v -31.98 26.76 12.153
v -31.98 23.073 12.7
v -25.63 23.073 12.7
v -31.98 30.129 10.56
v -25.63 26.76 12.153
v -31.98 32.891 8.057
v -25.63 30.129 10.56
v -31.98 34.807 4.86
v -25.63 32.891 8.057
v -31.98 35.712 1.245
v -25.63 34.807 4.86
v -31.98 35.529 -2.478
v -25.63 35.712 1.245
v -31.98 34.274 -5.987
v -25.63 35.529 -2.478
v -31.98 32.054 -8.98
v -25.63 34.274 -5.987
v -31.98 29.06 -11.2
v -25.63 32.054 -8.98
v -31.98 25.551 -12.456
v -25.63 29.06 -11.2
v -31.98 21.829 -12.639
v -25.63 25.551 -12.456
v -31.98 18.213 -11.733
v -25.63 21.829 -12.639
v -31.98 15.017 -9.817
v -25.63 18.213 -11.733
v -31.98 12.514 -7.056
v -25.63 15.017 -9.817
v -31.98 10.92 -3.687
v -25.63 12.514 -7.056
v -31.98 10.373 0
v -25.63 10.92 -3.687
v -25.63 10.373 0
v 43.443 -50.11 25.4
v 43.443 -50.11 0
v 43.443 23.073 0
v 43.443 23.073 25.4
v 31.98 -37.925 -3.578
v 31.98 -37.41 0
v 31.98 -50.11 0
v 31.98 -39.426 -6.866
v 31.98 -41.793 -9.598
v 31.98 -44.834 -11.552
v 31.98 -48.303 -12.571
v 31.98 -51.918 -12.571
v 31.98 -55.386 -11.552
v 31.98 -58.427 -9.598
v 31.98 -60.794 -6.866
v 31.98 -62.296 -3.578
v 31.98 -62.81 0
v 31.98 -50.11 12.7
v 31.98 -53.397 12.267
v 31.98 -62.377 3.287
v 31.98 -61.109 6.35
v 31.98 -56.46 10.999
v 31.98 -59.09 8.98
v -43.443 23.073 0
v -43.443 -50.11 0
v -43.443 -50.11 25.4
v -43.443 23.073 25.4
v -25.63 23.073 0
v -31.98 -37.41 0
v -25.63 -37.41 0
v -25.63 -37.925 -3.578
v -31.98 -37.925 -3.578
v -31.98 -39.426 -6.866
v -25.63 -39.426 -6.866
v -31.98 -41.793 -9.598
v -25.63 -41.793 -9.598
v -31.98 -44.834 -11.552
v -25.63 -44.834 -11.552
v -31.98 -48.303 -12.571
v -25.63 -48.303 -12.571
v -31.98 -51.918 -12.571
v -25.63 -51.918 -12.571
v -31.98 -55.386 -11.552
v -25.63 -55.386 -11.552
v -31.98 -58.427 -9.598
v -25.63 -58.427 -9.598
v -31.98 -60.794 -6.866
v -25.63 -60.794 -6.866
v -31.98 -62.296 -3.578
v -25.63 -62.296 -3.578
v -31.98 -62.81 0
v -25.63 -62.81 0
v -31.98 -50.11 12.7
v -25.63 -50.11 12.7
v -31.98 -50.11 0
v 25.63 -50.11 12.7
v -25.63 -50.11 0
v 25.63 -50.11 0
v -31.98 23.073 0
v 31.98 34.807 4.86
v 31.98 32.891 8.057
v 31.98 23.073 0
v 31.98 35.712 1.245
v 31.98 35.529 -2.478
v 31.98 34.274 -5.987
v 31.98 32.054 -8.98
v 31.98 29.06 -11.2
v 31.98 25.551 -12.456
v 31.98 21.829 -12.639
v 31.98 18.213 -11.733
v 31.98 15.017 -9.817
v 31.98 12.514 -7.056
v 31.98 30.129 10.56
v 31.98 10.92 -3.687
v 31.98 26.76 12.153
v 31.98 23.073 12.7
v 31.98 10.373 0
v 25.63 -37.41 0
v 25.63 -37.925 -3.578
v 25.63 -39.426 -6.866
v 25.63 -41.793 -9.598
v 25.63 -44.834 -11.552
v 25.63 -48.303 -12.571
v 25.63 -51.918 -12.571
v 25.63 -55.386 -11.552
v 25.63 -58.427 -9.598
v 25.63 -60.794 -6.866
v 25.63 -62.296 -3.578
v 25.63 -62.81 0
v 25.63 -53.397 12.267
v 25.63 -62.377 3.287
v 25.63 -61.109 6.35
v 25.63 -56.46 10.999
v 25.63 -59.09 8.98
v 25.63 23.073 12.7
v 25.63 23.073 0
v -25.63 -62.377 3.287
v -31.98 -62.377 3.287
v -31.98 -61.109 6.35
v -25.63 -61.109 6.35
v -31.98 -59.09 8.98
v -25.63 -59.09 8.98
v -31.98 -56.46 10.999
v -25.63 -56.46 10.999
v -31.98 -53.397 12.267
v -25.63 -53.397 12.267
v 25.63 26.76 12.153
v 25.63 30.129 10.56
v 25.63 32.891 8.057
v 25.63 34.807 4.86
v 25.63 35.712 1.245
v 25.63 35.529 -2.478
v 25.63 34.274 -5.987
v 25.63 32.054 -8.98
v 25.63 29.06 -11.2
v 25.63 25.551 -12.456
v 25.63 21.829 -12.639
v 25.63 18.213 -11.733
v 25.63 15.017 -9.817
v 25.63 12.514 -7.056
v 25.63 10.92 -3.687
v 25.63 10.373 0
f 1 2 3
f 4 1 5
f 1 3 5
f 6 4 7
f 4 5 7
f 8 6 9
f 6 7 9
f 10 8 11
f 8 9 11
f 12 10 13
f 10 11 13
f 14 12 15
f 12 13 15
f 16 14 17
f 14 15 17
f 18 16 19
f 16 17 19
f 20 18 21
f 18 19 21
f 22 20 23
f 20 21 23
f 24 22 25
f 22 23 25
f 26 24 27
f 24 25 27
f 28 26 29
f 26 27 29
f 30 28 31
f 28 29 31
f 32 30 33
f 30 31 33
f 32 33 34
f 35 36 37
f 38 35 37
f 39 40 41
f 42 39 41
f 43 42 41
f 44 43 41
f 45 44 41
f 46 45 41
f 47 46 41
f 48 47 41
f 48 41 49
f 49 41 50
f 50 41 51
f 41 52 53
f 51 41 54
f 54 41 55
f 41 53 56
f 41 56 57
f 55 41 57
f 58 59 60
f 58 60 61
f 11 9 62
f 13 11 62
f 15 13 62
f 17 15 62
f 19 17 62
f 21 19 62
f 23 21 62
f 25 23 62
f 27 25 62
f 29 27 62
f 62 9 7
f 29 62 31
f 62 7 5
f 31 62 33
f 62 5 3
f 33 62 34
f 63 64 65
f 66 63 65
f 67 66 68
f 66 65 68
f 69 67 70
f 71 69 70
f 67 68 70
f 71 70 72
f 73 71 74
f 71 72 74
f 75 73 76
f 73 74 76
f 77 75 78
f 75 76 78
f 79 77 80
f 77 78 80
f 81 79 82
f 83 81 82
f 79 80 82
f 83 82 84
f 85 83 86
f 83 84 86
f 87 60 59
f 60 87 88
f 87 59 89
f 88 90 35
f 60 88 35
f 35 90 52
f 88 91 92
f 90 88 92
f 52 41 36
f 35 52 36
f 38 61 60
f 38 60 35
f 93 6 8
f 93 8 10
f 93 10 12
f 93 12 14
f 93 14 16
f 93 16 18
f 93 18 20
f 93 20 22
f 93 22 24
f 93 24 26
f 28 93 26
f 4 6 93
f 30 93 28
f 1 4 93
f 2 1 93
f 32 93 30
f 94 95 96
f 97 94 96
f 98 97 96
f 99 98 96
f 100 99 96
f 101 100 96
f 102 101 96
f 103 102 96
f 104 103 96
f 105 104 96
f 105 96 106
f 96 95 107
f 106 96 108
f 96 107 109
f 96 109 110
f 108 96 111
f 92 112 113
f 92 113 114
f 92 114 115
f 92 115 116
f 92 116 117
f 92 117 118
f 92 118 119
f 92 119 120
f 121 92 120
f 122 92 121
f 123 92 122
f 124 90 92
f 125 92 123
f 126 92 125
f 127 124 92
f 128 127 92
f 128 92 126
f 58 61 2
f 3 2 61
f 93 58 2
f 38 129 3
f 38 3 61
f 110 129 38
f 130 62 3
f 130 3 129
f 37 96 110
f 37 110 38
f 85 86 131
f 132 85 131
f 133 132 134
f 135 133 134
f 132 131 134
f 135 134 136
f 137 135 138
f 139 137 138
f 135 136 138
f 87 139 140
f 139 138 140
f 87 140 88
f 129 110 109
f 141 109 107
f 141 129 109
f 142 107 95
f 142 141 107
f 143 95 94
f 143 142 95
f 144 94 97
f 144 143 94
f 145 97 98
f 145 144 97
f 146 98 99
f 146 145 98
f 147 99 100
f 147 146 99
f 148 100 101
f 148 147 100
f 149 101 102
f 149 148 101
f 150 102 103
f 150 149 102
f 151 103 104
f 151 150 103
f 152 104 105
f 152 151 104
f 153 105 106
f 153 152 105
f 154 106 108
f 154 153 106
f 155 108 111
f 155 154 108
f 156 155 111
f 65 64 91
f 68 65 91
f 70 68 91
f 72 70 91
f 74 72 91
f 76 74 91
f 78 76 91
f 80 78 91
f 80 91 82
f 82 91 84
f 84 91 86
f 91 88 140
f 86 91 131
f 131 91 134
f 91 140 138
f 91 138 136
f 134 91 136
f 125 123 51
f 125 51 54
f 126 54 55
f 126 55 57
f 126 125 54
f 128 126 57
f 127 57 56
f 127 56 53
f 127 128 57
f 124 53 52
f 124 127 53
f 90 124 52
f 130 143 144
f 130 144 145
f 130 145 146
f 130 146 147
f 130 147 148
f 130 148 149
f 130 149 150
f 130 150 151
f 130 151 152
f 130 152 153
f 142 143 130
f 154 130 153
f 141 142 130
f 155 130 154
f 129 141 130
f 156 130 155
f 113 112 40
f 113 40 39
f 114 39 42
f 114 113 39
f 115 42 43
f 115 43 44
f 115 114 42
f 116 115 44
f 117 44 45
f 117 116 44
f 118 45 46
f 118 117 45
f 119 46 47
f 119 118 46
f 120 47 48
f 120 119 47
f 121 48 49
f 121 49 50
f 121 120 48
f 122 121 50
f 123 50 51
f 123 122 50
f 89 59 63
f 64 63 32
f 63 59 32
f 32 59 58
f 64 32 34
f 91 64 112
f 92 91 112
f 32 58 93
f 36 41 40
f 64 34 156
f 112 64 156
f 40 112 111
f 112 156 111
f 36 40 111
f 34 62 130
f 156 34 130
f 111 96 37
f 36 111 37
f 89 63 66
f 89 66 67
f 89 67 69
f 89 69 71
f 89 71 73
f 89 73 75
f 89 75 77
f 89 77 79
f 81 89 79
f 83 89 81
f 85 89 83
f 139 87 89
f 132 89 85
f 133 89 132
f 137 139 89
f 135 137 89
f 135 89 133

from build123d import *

# Parameters (mm, degrees)
F0_W     = 69.07307
F0_H     = 73.183507
F1_DEPTH = 25.4
F3_DEPTH = 6.35


with BuildPart() as f1:
    # F0 (on Top) → F1 (new body)
    with BuildSketch(Plane.XY):
        with Locations((8.906385, -13.518363)):
            Rectangle(F0_W, F0_H)
    extrude(amount=F1_DEPTH)

    # F2 (on face) → F3 (join)
    with BuildSketch(Plane(origin=(-25.63015, 0, 0), x_dir=(0, -1, 0), z_dir=(-1, 0, 0))):
        with BuildLine():
            Line((-23.07339, 0), (-10.37339, 0))
            ThreePointArc((-10.37339, 0), (-14.093134, 8.980256), (-23.07339, 12.7))
            Line((-23.07339, 12.7), (-23.07339, 0))
        make_face()
        with BuildLine():
            ThreePointArc((-23.07339, 12.7), (-32.053646, -8.980256), (-10.37339, 0))
            Line((-10.37339, 0), (-23.07339, 0))
            Line((-23.07339, 0), (-23.07339, 12.7))
        make_face()
        with BuildLine():
            ThreePointArc((50.110117, 12.7), (41.12986, 8.980256), (37.410117, 0))
            Line((37.410117, 0), (50.110117, 0))
            Line((50.110117, 0), (50.110117, 12.7))
        make_face()
        with BuildLine():
            Line((50.110117, 0), (37.410117, 0))
            ThreePointArc((37.410117, 0), (50.110117, -12.7), (62.810117, 0))
            ThreePointArc((62.810117, 0), (59.090373, 8.980256), (50.110117, 12.7))
            Line((50.110117, 12.7), (50.110117, 0))
        make_face()
    extrude(amount=F3_DEPTH)

    # F4: F1 across plane


with BuildPart() as f1_1:
    add(f1.part)
    add(f1.part.mirror(Plane.YZ))


solid = f1_1.part
